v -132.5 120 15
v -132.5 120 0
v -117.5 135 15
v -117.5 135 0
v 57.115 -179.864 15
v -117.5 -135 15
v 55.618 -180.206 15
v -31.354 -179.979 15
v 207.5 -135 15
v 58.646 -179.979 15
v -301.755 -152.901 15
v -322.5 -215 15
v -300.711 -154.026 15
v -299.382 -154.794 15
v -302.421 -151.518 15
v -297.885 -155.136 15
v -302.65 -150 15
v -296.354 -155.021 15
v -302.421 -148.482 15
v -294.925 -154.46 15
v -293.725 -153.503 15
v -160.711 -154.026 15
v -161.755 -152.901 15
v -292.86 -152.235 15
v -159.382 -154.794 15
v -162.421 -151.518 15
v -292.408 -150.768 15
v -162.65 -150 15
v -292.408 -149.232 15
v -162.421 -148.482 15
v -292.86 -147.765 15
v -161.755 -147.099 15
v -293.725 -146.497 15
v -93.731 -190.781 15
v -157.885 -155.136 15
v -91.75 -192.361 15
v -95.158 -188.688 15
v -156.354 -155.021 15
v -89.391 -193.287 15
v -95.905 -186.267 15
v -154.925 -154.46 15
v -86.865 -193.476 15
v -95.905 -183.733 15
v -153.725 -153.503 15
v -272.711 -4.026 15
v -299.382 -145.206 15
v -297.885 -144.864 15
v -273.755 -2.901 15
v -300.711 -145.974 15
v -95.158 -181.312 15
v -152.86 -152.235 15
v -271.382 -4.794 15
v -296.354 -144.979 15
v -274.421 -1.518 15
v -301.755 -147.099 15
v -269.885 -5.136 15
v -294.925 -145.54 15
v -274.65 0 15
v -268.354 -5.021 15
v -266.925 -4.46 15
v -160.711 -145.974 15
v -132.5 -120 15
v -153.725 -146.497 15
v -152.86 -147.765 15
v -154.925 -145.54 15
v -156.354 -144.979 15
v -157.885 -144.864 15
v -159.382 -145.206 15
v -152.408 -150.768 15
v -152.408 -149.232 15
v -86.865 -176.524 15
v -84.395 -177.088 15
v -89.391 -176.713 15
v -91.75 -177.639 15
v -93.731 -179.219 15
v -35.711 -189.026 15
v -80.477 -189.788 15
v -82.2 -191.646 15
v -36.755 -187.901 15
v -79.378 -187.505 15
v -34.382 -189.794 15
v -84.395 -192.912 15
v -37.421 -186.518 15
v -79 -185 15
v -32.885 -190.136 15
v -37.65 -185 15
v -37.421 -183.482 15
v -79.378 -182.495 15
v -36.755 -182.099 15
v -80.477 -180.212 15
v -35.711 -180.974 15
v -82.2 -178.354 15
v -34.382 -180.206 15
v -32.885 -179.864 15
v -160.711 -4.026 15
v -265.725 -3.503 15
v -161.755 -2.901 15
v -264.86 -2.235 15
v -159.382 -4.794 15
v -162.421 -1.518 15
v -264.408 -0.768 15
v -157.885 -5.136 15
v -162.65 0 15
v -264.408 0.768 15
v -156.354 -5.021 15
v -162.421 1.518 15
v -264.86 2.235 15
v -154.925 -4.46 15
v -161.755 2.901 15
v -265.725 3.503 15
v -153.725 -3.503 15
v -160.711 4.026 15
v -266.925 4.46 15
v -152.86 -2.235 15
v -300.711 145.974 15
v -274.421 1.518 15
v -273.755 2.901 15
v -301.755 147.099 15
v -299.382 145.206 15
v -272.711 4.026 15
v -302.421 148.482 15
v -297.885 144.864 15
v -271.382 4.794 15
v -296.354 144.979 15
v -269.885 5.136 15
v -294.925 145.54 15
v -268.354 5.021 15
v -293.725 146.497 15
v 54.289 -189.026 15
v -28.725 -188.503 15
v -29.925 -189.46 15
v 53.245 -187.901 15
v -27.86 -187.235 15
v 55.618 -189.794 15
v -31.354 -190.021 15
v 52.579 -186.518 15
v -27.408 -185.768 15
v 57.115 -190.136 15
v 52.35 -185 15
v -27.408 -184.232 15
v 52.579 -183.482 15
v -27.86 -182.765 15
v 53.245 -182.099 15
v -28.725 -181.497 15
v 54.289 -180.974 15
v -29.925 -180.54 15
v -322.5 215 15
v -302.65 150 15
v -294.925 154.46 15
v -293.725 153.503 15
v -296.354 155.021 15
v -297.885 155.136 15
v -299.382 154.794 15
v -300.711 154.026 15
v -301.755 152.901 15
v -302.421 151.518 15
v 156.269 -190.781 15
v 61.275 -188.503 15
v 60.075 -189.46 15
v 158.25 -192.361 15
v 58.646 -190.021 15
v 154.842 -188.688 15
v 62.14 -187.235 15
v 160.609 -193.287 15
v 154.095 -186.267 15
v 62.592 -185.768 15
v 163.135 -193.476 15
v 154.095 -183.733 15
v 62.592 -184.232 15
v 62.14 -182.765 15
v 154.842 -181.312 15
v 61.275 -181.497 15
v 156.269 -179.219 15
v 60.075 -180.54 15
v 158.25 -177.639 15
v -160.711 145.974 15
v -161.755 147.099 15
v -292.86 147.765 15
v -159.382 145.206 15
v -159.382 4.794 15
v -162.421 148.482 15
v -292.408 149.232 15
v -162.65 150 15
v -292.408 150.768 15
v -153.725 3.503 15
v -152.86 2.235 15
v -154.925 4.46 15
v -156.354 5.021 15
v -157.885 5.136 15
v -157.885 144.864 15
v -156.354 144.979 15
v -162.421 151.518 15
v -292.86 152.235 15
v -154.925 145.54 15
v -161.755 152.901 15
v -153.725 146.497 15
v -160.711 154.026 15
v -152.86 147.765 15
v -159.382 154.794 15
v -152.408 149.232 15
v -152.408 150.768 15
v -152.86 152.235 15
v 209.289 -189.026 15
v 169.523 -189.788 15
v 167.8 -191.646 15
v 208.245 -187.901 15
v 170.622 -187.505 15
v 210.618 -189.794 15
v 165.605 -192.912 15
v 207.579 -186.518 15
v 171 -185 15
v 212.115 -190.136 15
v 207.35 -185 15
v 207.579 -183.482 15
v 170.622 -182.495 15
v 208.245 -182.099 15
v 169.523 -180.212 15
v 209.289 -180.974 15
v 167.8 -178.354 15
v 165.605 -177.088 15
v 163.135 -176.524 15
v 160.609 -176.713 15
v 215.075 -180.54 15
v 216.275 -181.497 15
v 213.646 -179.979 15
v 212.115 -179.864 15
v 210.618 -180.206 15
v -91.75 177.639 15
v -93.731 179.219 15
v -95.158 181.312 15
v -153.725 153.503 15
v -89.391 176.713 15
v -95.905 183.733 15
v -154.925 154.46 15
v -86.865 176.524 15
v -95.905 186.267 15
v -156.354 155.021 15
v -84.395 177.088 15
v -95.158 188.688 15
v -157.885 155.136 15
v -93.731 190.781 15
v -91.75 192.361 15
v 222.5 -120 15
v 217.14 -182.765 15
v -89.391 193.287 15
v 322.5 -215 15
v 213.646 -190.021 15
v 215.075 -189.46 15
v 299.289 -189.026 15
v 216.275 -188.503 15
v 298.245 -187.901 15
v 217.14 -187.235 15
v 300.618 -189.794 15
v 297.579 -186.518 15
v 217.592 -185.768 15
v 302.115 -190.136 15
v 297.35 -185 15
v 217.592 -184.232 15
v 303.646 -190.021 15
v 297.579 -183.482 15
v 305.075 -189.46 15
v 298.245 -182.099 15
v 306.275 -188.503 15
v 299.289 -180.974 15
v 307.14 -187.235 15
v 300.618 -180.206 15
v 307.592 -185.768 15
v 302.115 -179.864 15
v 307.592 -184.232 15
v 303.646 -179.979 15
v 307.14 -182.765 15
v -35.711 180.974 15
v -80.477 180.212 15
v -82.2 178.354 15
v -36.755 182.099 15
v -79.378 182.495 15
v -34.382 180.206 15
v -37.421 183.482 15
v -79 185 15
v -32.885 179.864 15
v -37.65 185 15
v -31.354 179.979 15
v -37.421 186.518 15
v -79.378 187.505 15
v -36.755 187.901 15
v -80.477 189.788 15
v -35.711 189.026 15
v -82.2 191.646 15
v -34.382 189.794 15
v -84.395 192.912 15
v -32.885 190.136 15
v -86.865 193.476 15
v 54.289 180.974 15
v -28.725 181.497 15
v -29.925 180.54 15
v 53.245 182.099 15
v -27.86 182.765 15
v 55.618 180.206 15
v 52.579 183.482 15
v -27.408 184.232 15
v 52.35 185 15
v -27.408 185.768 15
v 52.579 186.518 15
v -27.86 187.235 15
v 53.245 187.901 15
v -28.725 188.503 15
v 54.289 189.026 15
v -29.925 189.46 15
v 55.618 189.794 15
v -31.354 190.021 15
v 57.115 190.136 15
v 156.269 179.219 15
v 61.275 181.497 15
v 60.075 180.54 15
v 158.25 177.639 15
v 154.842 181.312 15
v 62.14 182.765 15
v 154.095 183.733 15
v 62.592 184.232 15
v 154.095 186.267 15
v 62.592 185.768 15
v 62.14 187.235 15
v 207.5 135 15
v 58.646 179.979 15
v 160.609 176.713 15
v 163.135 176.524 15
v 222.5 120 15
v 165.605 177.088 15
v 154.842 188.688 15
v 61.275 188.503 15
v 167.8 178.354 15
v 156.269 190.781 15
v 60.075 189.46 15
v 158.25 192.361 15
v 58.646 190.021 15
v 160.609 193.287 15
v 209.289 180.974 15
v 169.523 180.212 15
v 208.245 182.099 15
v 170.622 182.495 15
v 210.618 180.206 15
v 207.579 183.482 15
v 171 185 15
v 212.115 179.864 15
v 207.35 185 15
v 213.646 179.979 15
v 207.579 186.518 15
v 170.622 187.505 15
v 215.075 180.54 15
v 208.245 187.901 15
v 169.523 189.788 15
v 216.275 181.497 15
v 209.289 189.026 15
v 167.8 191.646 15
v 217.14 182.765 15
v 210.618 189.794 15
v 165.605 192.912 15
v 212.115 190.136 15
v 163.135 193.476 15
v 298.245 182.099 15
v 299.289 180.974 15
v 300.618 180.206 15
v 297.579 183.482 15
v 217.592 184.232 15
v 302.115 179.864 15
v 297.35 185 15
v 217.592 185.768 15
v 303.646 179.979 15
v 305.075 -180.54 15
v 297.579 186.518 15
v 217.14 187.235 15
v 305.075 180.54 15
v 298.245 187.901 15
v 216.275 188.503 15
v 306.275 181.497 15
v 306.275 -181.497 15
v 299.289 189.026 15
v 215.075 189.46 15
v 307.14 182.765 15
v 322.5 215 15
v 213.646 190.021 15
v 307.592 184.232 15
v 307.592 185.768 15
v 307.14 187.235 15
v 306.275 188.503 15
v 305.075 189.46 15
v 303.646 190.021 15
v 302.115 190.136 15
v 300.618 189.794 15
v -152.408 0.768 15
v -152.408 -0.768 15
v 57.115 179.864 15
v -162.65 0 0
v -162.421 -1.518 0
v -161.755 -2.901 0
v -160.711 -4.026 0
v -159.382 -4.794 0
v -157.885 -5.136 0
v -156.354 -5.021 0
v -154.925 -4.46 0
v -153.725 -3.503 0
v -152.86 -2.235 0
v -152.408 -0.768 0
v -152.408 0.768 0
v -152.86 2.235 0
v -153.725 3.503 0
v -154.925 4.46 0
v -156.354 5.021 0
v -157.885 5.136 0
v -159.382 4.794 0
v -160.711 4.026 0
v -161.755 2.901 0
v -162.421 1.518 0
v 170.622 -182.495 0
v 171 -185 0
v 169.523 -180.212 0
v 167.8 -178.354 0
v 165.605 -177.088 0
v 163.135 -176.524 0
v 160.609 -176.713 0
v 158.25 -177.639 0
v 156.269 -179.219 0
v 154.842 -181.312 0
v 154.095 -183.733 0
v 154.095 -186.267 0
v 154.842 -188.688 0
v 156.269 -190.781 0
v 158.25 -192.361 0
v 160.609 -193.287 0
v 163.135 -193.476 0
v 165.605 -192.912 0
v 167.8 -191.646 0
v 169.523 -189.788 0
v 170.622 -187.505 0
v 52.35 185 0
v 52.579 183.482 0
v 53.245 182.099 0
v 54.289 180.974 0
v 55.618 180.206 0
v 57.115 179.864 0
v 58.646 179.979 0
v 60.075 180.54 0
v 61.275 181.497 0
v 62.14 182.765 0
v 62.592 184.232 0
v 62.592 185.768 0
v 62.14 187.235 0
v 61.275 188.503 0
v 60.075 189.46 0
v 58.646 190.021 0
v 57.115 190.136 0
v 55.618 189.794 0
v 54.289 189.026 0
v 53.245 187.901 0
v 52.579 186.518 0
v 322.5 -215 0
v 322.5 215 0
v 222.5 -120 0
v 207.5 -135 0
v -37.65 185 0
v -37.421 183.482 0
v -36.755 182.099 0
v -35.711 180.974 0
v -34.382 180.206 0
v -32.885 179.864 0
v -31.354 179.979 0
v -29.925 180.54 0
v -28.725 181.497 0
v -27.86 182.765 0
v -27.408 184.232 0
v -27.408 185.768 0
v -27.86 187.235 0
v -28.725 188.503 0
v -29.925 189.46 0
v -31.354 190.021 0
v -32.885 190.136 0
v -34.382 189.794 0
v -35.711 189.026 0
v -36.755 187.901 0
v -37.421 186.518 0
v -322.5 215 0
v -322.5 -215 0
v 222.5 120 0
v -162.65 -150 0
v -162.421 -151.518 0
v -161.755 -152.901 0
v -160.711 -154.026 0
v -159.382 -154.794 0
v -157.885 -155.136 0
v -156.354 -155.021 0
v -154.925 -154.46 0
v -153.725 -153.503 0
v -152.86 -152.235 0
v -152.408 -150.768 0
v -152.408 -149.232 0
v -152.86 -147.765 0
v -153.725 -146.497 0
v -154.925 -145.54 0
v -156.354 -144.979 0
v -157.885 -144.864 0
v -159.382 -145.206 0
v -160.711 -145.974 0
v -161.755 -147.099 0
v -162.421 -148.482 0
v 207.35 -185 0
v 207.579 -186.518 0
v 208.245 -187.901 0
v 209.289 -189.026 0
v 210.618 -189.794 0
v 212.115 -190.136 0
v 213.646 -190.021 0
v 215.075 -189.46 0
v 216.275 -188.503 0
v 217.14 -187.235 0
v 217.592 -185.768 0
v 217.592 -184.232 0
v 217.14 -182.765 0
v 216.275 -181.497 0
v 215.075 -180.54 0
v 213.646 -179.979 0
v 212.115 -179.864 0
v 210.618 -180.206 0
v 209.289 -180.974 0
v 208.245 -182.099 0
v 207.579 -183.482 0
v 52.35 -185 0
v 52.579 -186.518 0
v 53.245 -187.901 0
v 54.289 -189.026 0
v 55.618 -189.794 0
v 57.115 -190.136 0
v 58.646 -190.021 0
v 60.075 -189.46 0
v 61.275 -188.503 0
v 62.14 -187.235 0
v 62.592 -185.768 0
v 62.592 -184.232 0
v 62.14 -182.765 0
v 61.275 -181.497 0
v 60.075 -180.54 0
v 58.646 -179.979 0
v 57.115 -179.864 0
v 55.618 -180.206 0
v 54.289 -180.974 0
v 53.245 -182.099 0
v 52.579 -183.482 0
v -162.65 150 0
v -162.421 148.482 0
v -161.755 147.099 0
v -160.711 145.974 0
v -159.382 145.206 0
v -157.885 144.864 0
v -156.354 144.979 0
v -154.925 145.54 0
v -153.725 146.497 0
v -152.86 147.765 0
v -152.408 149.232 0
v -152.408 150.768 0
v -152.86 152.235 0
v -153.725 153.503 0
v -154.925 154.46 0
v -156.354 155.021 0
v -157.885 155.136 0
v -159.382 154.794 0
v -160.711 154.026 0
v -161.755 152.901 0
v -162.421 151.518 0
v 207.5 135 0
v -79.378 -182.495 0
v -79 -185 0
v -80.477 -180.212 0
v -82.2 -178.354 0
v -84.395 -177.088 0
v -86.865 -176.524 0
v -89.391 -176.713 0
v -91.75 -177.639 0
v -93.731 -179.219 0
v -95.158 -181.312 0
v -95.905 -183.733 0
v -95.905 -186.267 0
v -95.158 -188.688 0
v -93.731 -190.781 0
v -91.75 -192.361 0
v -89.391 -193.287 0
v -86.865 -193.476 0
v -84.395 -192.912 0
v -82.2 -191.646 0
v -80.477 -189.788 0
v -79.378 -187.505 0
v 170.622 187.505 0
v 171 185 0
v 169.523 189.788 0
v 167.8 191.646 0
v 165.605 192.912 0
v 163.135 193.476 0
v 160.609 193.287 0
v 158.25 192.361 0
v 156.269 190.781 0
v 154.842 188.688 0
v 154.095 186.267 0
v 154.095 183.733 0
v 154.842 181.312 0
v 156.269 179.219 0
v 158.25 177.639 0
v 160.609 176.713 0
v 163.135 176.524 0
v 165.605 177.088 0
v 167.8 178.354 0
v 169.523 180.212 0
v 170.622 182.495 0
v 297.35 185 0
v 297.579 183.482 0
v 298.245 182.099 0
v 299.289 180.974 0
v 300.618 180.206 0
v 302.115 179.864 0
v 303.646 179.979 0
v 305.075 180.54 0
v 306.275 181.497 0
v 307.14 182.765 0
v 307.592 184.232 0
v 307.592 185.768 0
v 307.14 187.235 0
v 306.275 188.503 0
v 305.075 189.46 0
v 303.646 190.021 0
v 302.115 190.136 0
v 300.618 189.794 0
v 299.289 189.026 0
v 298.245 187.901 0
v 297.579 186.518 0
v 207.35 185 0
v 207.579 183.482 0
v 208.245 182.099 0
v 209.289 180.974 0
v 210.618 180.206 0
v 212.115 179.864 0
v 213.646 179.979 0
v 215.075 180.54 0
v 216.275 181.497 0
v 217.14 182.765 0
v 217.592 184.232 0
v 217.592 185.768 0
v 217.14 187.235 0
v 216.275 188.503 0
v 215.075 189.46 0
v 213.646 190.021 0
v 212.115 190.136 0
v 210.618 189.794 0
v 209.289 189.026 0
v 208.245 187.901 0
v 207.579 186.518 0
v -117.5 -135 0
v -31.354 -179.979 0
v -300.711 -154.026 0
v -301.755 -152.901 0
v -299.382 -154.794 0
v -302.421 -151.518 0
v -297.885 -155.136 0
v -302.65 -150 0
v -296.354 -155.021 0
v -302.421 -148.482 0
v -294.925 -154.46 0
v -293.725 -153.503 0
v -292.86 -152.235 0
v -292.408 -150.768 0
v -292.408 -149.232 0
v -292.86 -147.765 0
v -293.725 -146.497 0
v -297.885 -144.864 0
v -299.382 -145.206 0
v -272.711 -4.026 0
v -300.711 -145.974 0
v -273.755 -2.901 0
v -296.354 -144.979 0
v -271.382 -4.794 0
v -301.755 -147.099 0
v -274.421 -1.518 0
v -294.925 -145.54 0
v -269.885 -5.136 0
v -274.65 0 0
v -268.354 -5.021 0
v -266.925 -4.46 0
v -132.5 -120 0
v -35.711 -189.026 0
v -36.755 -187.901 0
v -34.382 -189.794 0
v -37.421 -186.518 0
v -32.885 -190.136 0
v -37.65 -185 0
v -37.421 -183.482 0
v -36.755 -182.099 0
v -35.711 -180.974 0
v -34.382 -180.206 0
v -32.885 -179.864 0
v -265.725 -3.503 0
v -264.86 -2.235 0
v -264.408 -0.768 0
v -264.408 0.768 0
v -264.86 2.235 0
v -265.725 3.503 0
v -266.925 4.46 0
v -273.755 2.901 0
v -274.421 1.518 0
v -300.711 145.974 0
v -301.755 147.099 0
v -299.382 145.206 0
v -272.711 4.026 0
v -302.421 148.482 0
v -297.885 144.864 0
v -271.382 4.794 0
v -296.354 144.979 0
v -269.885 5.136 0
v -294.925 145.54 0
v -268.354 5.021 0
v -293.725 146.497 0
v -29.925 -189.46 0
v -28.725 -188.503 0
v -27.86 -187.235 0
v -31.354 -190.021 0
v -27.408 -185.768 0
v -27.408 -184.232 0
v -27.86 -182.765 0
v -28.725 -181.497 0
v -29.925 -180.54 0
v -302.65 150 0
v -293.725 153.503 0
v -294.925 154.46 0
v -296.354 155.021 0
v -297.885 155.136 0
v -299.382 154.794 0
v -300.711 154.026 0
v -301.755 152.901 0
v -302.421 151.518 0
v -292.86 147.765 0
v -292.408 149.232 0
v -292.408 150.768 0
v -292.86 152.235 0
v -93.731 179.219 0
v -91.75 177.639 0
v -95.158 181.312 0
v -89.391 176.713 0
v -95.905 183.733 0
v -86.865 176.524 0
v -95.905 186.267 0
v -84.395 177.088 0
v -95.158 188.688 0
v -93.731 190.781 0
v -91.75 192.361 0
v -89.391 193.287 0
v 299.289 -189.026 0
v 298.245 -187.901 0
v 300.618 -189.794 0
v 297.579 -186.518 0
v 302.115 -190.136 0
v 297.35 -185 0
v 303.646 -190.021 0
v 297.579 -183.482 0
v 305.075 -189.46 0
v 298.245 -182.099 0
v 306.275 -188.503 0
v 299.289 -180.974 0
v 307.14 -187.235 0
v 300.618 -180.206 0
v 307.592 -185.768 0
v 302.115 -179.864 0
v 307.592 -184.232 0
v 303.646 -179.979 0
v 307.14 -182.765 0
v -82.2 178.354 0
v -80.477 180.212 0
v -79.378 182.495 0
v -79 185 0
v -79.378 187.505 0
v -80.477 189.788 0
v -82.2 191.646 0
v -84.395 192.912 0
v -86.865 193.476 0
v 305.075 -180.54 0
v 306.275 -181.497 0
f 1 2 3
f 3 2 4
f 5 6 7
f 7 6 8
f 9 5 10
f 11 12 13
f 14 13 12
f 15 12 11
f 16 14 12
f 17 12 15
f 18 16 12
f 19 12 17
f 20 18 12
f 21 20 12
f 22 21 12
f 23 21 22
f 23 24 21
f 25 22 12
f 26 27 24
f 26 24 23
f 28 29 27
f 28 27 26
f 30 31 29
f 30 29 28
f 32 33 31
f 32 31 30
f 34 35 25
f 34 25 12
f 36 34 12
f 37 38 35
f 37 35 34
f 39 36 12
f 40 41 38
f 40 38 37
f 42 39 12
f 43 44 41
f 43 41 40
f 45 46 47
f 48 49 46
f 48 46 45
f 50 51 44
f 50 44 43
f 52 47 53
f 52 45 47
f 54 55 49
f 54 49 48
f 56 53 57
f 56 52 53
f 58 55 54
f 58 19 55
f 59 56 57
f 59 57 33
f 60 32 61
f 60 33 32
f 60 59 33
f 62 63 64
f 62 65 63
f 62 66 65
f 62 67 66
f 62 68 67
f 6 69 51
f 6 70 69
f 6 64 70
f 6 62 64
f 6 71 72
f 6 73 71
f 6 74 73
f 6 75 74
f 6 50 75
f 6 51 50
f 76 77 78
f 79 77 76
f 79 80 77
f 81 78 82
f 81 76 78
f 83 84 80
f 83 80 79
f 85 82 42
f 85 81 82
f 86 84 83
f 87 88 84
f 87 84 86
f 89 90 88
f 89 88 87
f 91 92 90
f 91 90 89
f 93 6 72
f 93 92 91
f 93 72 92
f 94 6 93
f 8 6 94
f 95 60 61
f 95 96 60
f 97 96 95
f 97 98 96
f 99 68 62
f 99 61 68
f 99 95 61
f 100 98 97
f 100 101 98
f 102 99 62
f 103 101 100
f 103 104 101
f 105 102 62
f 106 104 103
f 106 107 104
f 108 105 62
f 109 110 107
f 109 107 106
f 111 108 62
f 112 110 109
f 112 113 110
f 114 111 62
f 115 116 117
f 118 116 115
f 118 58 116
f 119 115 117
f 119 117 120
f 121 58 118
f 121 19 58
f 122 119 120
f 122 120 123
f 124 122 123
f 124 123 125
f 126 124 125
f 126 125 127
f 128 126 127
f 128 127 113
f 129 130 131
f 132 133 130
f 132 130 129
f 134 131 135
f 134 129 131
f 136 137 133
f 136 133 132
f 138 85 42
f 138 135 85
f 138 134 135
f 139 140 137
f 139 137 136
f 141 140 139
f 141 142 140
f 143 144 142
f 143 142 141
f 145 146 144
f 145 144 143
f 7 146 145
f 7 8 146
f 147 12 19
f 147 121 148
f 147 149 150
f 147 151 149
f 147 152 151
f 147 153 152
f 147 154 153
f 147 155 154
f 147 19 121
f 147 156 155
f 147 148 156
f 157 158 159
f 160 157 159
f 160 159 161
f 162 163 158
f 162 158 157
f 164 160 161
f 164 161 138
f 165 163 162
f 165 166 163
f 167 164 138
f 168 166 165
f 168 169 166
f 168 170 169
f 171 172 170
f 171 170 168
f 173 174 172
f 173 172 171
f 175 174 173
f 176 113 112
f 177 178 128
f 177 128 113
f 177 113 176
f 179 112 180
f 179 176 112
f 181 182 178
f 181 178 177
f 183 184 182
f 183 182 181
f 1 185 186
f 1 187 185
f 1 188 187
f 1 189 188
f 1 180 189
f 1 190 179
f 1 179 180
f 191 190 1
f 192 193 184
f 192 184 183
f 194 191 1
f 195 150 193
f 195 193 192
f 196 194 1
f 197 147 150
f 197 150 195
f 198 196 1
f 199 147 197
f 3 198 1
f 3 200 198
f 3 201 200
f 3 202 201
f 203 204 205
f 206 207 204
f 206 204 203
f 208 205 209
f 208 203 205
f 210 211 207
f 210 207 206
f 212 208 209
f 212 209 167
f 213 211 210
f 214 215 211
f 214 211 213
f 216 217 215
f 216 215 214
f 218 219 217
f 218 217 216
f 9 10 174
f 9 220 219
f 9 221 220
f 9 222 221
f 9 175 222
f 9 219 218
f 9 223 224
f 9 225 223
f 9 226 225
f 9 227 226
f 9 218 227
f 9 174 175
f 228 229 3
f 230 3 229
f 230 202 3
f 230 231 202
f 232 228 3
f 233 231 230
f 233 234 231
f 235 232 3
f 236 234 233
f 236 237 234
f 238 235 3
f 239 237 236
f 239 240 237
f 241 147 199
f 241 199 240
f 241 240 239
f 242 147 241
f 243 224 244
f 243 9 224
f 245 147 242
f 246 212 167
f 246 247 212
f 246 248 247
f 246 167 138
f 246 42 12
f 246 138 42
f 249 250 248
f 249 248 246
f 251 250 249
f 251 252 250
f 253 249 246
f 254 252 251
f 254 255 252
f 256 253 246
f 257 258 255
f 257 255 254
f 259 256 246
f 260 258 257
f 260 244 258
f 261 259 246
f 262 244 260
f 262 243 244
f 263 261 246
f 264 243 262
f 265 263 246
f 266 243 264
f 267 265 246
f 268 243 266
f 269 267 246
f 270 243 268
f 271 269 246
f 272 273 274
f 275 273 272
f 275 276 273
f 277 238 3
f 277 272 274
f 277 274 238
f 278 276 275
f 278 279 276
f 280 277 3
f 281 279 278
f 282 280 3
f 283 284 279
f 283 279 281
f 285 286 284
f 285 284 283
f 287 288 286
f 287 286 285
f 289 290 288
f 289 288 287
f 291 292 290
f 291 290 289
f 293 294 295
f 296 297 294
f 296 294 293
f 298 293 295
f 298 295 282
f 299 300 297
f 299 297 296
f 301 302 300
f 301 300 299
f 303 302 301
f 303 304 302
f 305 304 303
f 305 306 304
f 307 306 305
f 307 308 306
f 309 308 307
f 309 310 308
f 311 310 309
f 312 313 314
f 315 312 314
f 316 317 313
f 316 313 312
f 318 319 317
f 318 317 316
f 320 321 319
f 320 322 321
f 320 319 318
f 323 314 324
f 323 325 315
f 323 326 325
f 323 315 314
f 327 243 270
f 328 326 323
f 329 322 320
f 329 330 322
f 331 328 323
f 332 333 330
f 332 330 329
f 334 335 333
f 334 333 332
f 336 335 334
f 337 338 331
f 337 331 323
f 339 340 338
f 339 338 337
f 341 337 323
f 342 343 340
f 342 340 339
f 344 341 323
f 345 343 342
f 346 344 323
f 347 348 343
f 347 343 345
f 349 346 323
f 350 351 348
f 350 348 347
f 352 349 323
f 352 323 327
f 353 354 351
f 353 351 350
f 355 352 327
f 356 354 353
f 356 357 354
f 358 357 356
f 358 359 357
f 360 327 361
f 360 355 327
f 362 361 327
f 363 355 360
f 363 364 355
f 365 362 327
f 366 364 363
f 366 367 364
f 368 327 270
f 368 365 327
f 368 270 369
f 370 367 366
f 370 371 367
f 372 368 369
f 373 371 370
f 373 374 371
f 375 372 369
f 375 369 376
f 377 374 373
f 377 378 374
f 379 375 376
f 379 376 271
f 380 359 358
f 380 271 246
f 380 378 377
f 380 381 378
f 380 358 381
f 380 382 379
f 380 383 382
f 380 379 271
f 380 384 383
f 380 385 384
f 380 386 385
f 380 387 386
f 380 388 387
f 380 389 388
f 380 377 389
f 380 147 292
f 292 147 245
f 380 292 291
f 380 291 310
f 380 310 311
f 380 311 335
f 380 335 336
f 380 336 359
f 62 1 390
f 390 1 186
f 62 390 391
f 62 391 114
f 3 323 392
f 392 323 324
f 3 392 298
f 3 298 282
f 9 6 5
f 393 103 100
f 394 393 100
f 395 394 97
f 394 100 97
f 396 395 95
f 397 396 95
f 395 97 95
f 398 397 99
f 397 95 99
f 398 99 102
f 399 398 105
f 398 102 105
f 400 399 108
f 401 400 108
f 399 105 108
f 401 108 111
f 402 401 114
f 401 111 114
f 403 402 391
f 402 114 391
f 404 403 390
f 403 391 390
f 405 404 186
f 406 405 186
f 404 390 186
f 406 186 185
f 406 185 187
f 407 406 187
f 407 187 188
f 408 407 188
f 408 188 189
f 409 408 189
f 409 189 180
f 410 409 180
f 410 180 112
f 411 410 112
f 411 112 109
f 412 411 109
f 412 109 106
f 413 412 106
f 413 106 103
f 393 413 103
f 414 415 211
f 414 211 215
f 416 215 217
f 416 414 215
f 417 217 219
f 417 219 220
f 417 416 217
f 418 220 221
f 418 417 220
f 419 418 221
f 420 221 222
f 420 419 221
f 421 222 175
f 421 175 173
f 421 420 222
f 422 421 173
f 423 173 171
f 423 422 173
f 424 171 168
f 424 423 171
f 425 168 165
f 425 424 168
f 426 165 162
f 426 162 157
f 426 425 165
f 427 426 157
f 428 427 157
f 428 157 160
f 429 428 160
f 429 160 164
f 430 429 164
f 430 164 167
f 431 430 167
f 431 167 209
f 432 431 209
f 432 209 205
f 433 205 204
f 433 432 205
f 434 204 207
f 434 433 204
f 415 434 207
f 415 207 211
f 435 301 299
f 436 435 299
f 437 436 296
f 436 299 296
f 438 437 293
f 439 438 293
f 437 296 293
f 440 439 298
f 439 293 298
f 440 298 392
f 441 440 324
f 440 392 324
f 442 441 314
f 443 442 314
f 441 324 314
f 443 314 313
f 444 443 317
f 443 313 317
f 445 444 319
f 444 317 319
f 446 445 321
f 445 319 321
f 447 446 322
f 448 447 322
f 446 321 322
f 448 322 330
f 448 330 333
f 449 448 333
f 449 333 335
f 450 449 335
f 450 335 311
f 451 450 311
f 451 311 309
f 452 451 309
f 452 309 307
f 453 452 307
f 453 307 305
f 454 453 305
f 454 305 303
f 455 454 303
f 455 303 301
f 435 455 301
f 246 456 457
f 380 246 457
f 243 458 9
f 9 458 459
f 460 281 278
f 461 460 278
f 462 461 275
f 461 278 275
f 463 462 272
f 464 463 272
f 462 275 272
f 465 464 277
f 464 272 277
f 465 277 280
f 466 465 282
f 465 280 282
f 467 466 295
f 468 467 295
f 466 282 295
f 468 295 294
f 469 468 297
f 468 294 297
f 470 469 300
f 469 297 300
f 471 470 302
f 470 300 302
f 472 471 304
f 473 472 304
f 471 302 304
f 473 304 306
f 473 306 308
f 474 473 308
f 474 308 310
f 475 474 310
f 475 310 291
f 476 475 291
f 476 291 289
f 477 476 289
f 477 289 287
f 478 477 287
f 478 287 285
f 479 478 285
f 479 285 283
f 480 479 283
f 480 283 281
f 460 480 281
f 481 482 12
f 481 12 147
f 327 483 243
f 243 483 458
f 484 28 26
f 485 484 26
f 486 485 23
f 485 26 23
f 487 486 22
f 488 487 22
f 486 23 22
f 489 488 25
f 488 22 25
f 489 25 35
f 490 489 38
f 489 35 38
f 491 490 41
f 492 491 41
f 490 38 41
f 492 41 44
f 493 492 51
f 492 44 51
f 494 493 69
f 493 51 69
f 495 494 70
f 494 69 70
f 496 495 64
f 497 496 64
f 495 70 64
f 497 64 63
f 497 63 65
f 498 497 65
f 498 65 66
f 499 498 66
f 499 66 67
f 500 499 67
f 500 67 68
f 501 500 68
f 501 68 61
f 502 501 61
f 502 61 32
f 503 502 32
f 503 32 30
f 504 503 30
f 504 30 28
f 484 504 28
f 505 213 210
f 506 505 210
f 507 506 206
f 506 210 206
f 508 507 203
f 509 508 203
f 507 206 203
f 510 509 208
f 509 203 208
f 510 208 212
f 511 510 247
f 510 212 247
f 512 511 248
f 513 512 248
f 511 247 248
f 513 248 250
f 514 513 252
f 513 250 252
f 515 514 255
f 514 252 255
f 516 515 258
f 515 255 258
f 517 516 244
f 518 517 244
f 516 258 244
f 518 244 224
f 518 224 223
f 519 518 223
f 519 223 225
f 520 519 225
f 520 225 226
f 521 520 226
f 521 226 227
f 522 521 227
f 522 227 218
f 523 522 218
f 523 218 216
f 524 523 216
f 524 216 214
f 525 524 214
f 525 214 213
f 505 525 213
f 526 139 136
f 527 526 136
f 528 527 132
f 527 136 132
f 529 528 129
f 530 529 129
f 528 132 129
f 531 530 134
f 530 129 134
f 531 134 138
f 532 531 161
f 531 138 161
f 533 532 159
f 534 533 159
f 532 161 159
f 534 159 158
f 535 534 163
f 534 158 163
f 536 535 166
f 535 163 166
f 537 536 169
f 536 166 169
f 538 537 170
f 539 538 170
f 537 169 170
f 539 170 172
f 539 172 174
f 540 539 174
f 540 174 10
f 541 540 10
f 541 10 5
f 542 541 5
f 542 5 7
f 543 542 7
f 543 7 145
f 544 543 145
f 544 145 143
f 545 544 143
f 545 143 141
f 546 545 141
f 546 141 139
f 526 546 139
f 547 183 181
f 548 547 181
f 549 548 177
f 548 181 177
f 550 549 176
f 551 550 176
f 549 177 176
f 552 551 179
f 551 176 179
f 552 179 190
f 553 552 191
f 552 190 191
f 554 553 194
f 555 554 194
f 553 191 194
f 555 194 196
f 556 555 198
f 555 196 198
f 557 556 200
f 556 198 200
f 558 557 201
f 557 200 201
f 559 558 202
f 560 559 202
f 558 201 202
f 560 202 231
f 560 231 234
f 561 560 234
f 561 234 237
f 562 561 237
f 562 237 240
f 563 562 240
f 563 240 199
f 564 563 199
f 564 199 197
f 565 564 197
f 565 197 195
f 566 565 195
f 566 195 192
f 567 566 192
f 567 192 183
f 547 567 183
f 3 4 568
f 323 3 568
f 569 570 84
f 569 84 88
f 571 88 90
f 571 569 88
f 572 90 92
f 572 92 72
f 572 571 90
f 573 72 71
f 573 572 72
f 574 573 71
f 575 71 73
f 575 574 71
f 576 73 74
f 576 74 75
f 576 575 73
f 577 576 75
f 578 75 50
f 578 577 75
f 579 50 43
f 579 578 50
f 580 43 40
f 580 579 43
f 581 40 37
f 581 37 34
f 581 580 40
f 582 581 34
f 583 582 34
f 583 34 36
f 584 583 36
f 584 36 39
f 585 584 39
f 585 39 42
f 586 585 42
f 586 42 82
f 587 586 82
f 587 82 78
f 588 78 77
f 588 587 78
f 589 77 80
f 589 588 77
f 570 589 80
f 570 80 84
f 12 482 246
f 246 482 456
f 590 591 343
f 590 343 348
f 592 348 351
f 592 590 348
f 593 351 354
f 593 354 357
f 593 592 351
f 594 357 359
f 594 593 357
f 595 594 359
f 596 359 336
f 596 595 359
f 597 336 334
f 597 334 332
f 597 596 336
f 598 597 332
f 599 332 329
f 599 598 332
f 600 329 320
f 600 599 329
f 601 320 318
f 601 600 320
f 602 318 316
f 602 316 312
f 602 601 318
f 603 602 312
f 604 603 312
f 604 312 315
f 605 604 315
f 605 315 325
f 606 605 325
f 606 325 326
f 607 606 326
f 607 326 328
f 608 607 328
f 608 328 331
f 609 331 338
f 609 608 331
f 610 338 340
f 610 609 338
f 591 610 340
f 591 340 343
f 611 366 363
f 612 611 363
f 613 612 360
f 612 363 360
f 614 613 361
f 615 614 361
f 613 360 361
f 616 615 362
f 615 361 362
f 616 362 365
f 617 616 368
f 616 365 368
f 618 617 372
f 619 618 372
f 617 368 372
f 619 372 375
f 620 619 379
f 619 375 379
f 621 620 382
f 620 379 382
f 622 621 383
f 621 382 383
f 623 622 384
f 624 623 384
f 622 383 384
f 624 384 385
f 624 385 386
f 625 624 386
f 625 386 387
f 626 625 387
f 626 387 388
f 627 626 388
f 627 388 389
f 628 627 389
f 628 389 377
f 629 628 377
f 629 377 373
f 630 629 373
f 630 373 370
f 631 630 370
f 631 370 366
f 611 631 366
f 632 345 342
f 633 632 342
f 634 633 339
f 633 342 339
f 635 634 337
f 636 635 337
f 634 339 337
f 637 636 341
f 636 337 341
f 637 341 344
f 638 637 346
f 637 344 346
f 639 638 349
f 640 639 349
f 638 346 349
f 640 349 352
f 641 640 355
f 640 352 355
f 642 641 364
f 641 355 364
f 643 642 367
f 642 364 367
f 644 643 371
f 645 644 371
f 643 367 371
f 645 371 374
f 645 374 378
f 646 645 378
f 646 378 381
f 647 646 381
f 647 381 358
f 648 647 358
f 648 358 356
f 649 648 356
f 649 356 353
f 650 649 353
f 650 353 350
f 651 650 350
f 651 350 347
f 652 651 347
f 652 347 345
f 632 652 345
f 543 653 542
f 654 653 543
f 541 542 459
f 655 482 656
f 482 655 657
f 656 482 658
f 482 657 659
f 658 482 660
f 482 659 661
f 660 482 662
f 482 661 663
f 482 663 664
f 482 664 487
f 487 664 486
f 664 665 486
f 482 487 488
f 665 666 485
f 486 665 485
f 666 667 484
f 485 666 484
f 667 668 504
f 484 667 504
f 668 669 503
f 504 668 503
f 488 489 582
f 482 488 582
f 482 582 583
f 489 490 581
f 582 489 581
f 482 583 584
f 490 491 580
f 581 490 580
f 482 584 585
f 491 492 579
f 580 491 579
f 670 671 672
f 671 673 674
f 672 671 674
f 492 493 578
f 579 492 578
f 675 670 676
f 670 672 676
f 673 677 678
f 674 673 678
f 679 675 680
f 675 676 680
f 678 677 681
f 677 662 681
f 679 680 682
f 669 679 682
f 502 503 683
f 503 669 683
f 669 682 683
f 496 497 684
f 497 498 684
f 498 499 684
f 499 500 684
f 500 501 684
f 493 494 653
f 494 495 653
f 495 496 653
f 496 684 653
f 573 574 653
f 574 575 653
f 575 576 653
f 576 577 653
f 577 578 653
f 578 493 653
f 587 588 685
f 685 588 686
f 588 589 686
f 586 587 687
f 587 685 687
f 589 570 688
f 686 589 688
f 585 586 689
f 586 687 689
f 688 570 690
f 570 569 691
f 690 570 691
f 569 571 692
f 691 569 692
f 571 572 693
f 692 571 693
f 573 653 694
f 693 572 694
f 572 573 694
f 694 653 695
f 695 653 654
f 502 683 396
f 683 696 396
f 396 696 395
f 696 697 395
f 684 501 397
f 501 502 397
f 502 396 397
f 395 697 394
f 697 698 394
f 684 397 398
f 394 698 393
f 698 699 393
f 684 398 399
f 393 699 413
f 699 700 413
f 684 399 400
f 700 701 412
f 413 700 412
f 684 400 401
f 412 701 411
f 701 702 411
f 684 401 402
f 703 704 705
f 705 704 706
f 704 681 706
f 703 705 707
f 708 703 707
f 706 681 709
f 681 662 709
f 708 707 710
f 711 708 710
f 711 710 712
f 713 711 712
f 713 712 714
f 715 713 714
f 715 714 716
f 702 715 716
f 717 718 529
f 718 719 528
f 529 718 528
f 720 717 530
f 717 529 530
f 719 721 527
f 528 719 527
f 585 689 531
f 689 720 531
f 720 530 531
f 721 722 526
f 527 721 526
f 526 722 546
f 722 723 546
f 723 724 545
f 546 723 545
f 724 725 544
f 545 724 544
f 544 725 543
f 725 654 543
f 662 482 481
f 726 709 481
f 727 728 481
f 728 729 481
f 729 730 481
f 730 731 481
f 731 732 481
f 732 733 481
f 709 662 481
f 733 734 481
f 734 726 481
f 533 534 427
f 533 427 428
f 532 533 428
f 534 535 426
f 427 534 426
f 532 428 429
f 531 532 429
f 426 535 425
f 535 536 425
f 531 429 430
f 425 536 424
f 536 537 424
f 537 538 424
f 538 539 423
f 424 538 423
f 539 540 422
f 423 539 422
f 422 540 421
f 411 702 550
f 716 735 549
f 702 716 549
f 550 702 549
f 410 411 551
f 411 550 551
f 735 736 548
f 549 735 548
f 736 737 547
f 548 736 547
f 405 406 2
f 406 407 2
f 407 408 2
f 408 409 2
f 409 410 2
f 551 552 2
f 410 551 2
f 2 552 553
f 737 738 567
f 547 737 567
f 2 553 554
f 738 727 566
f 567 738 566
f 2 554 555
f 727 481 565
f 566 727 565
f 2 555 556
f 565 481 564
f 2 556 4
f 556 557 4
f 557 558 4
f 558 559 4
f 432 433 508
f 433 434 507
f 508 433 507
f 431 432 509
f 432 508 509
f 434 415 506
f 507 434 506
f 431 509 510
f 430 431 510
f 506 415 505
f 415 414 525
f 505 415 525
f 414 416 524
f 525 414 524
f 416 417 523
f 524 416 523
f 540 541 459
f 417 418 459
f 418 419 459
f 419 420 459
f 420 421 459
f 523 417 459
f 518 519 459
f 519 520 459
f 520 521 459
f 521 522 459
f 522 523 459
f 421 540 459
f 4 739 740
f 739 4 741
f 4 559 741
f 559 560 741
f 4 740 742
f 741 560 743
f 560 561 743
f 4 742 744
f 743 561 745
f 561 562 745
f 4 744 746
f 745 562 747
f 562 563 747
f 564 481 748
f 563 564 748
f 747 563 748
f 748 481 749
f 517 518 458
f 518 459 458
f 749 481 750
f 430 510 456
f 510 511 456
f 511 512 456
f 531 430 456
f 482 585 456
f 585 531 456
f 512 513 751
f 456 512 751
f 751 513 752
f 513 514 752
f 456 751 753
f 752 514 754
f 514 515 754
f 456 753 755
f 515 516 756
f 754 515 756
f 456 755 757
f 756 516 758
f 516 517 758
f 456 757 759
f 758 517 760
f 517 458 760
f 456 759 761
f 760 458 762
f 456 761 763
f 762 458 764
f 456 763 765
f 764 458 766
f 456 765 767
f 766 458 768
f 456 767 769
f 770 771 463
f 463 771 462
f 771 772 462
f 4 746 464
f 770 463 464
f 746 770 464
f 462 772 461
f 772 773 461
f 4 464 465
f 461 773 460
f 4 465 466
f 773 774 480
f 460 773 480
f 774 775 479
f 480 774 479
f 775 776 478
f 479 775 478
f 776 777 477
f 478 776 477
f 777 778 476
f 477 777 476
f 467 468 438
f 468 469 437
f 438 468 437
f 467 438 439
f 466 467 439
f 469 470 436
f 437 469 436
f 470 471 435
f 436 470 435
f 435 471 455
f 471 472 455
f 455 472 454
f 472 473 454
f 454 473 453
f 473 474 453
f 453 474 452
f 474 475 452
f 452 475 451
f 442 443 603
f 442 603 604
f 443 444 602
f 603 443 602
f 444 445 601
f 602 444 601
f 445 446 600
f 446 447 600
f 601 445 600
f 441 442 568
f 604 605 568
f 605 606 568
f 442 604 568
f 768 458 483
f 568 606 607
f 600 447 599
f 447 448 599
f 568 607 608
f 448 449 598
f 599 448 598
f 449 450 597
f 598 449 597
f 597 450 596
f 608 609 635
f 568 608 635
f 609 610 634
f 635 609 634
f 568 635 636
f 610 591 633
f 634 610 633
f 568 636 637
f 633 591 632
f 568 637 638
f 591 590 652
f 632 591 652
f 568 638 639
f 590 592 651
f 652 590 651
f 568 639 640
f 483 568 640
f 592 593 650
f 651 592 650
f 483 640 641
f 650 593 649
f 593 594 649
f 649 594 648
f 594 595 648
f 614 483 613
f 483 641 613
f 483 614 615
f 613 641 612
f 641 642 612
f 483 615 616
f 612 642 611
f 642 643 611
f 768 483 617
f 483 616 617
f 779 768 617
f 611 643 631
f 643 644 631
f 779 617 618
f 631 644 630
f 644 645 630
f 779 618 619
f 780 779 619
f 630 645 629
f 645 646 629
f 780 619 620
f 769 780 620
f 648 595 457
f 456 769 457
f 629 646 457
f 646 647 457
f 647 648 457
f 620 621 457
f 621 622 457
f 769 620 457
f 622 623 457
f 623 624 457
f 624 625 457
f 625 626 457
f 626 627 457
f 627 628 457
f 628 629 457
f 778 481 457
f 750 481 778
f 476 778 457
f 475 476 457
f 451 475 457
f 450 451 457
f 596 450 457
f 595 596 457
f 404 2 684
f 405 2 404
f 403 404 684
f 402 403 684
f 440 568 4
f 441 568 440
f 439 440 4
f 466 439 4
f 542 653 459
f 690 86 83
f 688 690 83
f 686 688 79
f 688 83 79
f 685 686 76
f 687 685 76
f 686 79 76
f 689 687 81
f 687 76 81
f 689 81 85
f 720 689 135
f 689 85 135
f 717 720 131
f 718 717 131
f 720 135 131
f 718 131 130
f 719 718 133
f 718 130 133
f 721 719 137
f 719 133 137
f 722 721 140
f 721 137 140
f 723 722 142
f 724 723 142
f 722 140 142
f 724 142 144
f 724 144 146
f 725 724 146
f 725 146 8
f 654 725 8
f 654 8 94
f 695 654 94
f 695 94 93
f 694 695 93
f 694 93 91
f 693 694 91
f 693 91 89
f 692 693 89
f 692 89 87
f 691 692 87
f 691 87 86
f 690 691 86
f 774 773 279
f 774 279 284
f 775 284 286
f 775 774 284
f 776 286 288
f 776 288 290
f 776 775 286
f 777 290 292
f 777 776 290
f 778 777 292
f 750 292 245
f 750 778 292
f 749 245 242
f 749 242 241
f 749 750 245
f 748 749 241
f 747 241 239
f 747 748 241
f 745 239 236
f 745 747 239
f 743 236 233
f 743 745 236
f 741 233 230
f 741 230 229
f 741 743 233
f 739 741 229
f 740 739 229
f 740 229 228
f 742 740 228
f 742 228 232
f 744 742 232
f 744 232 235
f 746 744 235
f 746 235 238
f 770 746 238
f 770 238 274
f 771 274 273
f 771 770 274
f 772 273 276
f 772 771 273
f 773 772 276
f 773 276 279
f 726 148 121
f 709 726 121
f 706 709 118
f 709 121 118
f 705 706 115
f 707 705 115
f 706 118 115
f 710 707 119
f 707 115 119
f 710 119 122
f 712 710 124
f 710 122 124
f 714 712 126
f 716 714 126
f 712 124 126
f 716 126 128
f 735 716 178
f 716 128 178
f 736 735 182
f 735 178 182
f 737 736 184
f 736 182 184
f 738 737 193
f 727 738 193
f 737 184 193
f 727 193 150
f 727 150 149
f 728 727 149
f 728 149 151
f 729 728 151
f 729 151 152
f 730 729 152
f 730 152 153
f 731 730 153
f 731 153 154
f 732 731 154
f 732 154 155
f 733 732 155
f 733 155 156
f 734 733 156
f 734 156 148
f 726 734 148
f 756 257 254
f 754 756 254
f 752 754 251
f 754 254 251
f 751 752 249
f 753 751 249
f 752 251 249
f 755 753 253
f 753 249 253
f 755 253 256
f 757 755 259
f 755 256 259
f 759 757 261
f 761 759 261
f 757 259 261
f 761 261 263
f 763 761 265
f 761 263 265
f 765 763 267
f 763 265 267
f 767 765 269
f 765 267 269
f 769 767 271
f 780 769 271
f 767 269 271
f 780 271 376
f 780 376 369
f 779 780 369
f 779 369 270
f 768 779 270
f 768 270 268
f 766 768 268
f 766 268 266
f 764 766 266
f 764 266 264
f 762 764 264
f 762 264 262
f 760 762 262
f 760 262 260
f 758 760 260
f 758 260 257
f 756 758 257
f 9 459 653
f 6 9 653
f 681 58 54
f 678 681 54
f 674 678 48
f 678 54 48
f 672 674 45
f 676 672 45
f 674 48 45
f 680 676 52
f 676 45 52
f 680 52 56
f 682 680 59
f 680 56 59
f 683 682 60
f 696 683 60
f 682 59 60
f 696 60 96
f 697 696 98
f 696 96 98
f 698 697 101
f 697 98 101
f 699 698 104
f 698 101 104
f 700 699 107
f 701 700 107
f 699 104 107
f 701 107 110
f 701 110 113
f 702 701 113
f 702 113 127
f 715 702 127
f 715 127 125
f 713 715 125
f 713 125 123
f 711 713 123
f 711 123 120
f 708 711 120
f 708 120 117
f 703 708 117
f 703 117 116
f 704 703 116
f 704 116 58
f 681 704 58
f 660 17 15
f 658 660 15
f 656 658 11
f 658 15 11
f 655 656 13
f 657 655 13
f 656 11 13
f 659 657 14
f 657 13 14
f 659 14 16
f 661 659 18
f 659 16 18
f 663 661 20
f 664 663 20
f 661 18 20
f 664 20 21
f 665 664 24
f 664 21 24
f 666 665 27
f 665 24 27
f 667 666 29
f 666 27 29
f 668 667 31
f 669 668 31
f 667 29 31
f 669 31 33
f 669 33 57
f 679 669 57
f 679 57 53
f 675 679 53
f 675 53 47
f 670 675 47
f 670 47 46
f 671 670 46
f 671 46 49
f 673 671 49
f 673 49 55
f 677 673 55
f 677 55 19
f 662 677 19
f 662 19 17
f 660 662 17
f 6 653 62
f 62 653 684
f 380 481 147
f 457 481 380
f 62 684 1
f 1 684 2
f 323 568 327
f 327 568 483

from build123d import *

# Parameters (mm, degrees)
F0_W     = 645
F0_H     = 430
F1_DEPTH = 15
F3_D     = 10.3
F4_R     = 8.5
F5_DEPTH = 15


with BuildPart() as f1:
    # F0 (on Top) → F1 (new body)
    with BuildSketch(Plane.XY):
        Rectangle(F0_W, F0_H)
        Polygon((-132.5, 120), (-117.5, 135), (207.5, 135), (222.5, 120), (222.5, -120), (207.5, -135), (-117.5, -135), (-132.5, -120), align=None, mode=Mode.SUBTRACT)
    extrude(amount=F1_DEPTH)

    # F3 (through all)
    with Locations(Plane(origin=(0, 0, 0), x_dir=(1, 0, 0), z_dir=(0, 0, -1))):
        with Locations((-297.5, -150), (-297.5, 150), (-157.5, -150), (-157.5, 0), (-157.5, 150), (-32.5, 185), (57.5, 185), (212.5, 185), (302.5, 185), (302.5, -185), (212.5, -185), (57.5, -185), (-32.5, -185), (-269.5, 0)):
            Hole(F3_D / 2)

    # F4 (on Top) → F5 (cut, through all)
    with BuildSketch(Plane.XY):
        with Locations((-87.5, 185)):
            Circle(F4_R)
        with Locations((162.5, 185)):
            Circle(F4_R)
        with Locations((162.5, -185)):
            Circle(F4_R)
        with Locations((-87.5, -185)):
            Circle(F4_R)
    extrude(amount=F5_DEPTH, mode=Mode.SUBTRACT)


solid = f1.part
